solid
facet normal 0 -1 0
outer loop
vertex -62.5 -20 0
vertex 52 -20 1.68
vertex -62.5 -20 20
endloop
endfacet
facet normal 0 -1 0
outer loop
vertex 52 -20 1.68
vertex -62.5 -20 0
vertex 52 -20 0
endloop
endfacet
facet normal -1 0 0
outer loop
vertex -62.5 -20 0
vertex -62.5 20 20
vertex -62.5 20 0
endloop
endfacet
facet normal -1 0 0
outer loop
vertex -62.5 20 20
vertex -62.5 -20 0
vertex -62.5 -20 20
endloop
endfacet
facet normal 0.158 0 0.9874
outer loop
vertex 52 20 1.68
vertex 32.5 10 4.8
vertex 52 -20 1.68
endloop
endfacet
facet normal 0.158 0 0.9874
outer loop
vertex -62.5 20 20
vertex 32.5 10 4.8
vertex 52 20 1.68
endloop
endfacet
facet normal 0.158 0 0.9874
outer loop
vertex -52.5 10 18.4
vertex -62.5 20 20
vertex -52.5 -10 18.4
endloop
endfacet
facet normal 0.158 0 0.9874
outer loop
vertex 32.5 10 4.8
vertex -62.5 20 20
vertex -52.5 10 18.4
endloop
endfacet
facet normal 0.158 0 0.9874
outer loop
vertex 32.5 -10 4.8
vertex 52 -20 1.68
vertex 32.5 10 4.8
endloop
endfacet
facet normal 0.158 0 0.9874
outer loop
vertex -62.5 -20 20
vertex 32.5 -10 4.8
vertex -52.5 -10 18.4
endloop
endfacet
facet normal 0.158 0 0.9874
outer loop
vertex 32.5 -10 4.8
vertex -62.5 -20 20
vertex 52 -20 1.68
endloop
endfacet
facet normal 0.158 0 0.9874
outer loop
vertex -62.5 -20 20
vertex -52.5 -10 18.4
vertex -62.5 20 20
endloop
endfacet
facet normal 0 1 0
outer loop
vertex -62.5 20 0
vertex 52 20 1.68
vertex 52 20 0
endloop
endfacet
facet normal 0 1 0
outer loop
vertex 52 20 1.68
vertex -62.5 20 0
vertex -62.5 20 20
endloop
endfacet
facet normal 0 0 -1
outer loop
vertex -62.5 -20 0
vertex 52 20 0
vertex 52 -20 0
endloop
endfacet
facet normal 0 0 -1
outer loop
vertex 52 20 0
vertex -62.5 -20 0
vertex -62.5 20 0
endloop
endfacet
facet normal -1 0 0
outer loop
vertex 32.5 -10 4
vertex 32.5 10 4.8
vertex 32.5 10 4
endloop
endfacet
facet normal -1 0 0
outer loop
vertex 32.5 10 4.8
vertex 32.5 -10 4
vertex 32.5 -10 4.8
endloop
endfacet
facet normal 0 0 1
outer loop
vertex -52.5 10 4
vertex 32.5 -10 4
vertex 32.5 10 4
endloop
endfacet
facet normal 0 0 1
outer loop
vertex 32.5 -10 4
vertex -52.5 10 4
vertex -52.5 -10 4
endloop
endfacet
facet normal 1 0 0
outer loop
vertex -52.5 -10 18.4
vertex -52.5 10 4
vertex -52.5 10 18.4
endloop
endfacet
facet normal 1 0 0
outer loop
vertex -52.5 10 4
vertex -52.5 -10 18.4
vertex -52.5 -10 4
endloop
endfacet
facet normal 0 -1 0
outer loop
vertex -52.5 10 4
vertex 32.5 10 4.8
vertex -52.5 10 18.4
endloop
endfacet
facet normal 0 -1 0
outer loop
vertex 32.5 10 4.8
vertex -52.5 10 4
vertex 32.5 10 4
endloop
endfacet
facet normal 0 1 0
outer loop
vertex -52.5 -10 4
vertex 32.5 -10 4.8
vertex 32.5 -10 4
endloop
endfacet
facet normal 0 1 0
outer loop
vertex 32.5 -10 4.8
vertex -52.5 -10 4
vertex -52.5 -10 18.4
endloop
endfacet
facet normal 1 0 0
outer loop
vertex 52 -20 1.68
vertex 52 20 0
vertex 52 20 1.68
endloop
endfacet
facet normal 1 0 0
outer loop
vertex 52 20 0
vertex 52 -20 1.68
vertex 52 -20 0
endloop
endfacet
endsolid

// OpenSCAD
door_stopper_simple ();

module door_stopper_simple ()
{
    height = 20  ;
    length = 125 ;
    width= 40 ;
    half_width  = width / 2;
    
    borders = 10; // 1 cm on each side

    top_cube_length = length - 4 * borders;
    top_cube_width  = width - 2 * borders;
    top_cube_height = height ;  // make it big enough
    top_z = height/2 + 4 ; // adjust manually ;)

    tip_cut_pos = length/2 - 0.5;

    difference() {
	translate ([-length/2.0, 0, 0]) {
    	    polyhedron (	
	    		points = [[0, -half_width, height], [0, half_width, height], [0, half_width, 0], [0, -half_width, 0], [length, -half_width, 0], [length, half_width, 0]],
			triangles = [[0,3,2], [0,2,1], [3,0,4], [1,2,5], [0,5,4], [0,1,5],  [5,2,4], [4,2,3], ]);
	}

	// top inset
	translate ([-1 * borders, 0, top_z]) {
	    # cube ([top_cube_length,
		     top_cube_width,
		     top_cube_height],
		    center=true) ;
	}
	// cut of the tip a bit

	translate ([tip_cut_pos, 0, 0]) {
	    # cube ([20,
		     width + 1,
		     height],
		    center=true) ;
	}
    }
}
